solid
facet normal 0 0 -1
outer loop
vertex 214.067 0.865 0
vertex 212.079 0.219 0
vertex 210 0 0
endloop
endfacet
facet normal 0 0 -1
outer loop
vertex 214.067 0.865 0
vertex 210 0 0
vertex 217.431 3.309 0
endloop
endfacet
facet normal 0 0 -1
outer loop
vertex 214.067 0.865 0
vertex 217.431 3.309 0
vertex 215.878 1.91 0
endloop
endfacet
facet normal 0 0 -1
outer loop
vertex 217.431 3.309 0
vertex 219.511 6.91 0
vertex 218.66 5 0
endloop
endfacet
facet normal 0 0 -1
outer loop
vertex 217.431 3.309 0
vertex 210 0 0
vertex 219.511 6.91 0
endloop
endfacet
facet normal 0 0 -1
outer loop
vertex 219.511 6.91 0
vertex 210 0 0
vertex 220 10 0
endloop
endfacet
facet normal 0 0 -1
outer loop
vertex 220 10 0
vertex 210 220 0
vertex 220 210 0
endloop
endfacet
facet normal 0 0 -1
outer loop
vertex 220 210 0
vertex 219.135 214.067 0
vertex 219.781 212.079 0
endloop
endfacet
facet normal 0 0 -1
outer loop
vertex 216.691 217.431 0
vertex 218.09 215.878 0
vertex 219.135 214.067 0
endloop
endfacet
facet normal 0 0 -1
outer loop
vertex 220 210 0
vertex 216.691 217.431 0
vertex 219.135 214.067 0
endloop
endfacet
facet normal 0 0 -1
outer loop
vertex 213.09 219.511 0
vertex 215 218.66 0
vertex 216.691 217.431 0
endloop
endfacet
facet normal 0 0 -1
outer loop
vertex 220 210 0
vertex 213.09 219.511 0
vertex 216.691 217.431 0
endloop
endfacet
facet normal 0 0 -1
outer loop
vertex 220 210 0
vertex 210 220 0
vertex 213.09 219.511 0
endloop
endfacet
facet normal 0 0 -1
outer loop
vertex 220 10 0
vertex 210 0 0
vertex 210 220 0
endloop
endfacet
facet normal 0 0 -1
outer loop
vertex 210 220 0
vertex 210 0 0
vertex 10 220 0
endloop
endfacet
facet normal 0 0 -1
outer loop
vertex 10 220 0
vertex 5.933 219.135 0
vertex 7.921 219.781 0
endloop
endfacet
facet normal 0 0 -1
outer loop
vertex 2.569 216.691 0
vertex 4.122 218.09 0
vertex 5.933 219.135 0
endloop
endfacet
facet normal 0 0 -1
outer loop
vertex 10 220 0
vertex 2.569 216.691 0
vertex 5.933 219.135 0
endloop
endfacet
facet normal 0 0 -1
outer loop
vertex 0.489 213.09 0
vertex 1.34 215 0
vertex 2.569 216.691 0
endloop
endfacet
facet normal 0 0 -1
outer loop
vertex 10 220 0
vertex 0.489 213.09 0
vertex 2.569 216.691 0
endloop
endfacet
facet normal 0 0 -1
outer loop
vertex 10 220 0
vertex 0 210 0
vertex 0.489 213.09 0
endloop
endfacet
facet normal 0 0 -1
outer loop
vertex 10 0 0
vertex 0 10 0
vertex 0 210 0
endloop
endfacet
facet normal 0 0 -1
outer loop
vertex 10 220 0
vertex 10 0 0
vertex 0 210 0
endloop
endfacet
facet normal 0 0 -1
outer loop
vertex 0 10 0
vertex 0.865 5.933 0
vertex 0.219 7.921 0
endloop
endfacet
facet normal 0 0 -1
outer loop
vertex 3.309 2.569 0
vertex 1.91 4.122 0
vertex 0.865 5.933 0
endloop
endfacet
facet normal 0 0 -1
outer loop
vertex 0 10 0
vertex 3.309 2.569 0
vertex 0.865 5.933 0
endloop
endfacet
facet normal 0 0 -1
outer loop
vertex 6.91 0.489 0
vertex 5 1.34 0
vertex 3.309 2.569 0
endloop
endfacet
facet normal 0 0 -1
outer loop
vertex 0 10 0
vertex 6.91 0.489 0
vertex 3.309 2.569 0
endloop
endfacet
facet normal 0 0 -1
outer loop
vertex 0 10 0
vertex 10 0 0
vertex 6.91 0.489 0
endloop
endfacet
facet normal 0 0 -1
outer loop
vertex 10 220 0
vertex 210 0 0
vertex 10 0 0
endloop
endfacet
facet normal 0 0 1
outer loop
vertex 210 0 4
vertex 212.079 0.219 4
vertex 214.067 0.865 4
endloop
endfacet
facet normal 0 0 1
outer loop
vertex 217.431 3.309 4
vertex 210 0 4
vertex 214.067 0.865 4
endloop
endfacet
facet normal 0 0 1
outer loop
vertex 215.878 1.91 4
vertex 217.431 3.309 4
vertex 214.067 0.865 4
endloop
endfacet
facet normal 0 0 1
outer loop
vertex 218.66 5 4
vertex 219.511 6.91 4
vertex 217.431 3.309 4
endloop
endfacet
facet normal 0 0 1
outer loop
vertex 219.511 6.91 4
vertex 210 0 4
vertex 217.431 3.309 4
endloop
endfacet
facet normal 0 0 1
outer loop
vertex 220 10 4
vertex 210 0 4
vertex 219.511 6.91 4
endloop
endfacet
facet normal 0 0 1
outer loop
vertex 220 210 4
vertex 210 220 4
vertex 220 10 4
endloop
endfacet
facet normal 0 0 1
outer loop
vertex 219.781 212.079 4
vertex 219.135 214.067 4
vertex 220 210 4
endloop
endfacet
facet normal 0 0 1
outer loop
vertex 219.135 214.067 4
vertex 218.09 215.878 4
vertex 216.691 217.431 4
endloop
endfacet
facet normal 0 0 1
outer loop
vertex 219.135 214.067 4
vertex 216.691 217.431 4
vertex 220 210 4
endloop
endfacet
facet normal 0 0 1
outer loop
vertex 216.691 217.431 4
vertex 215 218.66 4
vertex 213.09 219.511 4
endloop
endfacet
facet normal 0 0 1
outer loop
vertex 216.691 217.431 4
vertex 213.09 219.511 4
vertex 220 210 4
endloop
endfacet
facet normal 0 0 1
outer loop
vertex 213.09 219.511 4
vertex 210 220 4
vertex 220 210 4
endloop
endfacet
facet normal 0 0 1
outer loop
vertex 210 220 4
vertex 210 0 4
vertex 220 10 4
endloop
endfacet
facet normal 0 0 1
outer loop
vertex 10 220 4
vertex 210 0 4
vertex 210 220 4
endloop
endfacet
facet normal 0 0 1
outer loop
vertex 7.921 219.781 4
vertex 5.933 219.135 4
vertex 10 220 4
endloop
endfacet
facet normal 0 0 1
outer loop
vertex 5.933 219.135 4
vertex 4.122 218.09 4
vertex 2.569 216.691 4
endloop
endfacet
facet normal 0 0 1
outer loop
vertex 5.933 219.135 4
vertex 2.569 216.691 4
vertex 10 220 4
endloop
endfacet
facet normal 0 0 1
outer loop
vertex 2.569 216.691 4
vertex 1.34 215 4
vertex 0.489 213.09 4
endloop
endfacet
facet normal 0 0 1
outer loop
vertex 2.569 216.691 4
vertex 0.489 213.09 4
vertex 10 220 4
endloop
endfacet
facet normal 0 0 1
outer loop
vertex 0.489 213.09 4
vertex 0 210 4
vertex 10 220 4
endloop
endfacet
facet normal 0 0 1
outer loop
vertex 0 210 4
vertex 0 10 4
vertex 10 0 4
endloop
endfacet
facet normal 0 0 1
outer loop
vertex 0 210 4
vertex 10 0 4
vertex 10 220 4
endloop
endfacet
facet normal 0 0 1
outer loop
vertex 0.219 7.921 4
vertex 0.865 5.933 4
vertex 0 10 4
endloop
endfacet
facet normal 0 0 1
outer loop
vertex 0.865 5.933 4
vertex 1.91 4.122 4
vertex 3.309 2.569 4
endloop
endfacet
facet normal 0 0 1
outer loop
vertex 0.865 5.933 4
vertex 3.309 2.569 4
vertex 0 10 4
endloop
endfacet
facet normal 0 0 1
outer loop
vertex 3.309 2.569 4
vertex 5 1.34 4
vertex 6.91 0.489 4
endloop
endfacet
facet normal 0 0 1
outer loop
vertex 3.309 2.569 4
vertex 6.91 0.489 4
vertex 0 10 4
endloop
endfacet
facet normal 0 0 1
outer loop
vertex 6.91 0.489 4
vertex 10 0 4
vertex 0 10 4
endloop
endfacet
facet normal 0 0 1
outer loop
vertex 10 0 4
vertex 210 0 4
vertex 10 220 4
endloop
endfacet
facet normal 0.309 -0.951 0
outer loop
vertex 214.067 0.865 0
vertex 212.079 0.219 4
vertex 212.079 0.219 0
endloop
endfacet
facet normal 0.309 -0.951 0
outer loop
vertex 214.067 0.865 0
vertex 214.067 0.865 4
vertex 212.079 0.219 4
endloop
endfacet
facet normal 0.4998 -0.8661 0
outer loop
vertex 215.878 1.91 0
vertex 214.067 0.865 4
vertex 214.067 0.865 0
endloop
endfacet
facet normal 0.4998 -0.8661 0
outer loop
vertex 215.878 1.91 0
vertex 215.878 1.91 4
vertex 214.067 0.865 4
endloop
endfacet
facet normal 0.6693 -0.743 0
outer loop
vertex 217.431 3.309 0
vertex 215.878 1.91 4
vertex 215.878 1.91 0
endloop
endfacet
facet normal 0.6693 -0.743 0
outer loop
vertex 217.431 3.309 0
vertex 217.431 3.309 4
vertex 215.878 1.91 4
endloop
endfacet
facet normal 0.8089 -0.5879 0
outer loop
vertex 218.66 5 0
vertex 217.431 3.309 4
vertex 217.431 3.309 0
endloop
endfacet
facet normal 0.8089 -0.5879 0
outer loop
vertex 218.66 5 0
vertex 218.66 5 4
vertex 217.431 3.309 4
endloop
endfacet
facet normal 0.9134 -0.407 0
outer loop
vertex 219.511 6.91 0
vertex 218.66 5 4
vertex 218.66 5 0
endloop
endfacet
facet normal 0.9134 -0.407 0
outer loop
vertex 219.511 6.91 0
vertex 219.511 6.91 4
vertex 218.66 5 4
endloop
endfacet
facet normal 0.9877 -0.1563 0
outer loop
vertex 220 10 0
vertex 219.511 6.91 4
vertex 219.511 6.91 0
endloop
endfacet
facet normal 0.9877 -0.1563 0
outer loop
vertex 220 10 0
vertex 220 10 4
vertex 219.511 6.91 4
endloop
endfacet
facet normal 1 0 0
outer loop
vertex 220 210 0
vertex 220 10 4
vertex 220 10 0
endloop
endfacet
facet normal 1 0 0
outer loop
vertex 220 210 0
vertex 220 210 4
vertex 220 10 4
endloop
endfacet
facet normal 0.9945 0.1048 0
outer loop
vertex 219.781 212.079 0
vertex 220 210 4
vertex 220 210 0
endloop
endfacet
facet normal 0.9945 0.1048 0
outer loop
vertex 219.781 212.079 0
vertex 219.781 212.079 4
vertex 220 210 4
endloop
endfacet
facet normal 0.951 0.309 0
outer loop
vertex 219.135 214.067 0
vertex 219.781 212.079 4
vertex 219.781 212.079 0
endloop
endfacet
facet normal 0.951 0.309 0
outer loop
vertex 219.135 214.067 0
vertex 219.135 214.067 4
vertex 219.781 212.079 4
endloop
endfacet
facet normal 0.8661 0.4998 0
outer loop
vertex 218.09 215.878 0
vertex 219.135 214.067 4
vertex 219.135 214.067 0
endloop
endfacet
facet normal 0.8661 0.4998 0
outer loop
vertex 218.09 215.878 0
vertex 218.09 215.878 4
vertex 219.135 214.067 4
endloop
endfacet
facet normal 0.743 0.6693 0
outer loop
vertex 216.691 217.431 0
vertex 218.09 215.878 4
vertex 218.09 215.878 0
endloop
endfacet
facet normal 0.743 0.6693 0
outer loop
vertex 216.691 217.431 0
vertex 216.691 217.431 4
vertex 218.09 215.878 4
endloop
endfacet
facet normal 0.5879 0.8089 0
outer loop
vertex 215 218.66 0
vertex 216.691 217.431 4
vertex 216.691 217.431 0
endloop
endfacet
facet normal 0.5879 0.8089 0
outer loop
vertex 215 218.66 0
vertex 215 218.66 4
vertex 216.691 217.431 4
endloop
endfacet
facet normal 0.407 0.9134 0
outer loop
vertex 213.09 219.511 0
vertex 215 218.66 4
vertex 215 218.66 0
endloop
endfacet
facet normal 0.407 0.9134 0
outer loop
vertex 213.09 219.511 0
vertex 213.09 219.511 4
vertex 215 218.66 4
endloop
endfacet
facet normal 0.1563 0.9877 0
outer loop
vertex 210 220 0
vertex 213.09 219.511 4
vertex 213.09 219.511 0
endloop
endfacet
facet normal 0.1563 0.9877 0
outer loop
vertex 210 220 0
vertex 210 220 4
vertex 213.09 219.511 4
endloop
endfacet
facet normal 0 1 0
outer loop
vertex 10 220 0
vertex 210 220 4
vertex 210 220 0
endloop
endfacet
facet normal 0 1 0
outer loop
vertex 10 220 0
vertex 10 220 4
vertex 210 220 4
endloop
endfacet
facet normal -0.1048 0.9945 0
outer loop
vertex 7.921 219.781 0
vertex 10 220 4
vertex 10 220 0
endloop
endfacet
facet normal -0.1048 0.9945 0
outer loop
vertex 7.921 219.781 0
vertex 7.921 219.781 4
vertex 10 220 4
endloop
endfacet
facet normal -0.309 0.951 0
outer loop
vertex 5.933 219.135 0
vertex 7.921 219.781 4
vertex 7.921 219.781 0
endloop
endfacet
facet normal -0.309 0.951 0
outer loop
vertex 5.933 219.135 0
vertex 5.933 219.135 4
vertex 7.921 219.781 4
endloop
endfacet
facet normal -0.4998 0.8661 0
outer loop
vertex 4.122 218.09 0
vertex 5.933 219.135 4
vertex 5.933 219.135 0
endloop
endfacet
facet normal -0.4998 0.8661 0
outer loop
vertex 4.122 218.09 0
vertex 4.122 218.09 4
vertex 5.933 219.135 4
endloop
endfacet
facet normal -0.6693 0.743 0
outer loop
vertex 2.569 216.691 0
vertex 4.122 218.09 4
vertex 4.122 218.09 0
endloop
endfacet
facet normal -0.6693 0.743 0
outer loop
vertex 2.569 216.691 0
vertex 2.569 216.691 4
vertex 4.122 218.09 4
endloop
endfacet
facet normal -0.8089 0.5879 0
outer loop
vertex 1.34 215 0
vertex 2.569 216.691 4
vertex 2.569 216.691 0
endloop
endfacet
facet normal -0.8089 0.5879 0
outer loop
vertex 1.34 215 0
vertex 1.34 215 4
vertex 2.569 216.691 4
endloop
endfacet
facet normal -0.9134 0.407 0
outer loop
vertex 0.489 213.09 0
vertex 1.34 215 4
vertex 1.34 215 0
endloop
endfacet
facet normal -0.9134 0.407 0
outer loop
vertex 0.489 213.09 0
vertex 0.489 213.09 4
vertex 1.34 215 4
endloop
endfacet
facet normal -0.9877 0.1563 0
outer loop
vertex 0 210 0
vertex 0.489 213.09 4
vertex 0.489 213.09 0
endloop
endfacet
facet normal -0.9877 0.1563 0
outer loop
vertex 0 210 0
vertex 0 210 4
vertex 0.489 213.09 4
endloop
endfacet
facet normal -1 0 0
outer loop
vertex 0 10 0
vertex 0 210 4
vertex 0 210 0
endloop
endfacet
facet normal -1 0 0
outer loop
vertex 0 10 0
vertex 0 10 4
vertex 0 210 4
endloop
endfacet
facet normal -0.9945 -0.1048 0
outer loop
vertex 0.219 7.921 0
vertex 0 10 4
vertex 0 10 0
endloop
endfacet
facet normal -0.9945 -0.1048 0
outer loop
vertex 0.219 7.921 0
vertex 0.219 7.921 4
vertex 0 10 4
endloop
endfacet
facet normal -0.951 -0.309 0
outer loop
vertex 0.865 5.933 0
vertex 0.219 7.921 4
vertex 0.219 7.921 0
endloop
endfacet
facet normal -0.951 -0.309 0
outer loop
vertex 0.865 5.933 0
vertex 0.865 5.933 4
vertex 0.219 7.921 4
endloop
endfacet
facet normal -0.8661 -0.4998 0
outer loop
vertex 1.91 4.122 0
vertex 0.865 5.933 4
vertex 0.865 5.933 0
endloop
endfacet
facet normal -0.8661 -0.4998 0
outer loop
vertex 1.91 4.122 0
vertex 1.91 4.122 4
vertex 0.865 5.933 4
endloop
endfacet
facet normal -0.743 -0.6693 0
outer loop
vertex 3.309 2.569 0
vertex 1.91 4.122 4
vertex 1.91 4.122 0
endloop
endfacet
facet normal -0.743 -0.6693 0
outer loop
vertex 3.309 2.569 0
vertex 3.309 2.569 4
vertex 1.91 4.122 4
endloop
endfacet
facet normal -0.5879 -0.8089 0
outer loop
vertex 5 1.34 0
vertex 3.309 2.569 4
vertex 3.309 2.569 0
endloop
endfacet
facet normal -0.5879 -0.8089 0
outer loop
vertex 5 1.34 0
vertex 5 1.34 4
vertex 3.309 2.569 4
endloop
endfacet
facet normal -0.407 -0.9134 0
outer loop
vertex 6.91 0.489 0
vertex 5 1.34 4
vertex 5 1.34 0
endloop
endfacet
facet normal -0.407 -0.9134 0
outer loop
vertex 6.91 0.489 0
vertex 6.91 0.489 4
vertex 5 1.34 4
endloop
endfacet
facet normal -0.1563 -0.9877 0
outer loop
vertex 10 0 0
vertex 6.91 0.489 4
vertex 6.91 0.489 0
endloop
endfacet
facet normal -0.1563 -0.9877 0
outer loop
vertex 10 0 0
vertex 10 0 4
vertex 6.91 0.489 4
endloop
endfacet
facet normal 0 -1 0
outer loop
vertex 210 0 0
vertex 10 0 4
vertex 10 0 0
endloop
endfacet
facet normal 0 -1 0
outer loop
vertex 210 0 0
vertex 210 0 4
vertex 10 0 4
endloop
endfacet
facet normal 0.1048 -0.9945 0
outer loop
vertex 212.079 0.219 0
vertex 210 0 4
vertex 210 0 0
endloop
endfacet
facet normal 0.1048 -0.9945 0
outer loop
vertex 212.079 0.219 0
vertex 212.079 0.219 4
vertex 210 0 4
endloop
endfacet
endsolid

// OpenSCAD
// file: ../lib/rounded_rectangle.scad
*rounded_rectangle();

module rounded_rectangle(size = [ 50, 30 ], radius = 1e10, center = true) {
  max_radius = min(size.x, size.y) * 0.49;
  clamped_radius = min(max(0, radius), max_radius);
  base_size = [ size.x - 2 * clamped_radius, size.y - 2 * clamped_radius ];

  translation = center ? [ 0, 0, 0 ] : [ size.x / 2, size.y / 2, 0 ];

  translate(translation) {
    offset(r = clamped_radius) { square(base_size, center = true); }
  }
}
// file: ../lib/semi_rounded_cube.scad
include <rounded_rectangle.scad>
*semi_rounded_cube();

module semi_rounded_cube(size = [ 50, 30, 20 ], radius = 1e10, center = false) {
  linear_extrude(size.z) {
    rounded_rectangle(size = [ size.x, size.y ], radius = radius, center = center);
  }
}
// main file
include <../lib/semi_rounded_cube.scad>

semi_rounded_cube(size = [ 220, 220, 4 ], radius = 10);
